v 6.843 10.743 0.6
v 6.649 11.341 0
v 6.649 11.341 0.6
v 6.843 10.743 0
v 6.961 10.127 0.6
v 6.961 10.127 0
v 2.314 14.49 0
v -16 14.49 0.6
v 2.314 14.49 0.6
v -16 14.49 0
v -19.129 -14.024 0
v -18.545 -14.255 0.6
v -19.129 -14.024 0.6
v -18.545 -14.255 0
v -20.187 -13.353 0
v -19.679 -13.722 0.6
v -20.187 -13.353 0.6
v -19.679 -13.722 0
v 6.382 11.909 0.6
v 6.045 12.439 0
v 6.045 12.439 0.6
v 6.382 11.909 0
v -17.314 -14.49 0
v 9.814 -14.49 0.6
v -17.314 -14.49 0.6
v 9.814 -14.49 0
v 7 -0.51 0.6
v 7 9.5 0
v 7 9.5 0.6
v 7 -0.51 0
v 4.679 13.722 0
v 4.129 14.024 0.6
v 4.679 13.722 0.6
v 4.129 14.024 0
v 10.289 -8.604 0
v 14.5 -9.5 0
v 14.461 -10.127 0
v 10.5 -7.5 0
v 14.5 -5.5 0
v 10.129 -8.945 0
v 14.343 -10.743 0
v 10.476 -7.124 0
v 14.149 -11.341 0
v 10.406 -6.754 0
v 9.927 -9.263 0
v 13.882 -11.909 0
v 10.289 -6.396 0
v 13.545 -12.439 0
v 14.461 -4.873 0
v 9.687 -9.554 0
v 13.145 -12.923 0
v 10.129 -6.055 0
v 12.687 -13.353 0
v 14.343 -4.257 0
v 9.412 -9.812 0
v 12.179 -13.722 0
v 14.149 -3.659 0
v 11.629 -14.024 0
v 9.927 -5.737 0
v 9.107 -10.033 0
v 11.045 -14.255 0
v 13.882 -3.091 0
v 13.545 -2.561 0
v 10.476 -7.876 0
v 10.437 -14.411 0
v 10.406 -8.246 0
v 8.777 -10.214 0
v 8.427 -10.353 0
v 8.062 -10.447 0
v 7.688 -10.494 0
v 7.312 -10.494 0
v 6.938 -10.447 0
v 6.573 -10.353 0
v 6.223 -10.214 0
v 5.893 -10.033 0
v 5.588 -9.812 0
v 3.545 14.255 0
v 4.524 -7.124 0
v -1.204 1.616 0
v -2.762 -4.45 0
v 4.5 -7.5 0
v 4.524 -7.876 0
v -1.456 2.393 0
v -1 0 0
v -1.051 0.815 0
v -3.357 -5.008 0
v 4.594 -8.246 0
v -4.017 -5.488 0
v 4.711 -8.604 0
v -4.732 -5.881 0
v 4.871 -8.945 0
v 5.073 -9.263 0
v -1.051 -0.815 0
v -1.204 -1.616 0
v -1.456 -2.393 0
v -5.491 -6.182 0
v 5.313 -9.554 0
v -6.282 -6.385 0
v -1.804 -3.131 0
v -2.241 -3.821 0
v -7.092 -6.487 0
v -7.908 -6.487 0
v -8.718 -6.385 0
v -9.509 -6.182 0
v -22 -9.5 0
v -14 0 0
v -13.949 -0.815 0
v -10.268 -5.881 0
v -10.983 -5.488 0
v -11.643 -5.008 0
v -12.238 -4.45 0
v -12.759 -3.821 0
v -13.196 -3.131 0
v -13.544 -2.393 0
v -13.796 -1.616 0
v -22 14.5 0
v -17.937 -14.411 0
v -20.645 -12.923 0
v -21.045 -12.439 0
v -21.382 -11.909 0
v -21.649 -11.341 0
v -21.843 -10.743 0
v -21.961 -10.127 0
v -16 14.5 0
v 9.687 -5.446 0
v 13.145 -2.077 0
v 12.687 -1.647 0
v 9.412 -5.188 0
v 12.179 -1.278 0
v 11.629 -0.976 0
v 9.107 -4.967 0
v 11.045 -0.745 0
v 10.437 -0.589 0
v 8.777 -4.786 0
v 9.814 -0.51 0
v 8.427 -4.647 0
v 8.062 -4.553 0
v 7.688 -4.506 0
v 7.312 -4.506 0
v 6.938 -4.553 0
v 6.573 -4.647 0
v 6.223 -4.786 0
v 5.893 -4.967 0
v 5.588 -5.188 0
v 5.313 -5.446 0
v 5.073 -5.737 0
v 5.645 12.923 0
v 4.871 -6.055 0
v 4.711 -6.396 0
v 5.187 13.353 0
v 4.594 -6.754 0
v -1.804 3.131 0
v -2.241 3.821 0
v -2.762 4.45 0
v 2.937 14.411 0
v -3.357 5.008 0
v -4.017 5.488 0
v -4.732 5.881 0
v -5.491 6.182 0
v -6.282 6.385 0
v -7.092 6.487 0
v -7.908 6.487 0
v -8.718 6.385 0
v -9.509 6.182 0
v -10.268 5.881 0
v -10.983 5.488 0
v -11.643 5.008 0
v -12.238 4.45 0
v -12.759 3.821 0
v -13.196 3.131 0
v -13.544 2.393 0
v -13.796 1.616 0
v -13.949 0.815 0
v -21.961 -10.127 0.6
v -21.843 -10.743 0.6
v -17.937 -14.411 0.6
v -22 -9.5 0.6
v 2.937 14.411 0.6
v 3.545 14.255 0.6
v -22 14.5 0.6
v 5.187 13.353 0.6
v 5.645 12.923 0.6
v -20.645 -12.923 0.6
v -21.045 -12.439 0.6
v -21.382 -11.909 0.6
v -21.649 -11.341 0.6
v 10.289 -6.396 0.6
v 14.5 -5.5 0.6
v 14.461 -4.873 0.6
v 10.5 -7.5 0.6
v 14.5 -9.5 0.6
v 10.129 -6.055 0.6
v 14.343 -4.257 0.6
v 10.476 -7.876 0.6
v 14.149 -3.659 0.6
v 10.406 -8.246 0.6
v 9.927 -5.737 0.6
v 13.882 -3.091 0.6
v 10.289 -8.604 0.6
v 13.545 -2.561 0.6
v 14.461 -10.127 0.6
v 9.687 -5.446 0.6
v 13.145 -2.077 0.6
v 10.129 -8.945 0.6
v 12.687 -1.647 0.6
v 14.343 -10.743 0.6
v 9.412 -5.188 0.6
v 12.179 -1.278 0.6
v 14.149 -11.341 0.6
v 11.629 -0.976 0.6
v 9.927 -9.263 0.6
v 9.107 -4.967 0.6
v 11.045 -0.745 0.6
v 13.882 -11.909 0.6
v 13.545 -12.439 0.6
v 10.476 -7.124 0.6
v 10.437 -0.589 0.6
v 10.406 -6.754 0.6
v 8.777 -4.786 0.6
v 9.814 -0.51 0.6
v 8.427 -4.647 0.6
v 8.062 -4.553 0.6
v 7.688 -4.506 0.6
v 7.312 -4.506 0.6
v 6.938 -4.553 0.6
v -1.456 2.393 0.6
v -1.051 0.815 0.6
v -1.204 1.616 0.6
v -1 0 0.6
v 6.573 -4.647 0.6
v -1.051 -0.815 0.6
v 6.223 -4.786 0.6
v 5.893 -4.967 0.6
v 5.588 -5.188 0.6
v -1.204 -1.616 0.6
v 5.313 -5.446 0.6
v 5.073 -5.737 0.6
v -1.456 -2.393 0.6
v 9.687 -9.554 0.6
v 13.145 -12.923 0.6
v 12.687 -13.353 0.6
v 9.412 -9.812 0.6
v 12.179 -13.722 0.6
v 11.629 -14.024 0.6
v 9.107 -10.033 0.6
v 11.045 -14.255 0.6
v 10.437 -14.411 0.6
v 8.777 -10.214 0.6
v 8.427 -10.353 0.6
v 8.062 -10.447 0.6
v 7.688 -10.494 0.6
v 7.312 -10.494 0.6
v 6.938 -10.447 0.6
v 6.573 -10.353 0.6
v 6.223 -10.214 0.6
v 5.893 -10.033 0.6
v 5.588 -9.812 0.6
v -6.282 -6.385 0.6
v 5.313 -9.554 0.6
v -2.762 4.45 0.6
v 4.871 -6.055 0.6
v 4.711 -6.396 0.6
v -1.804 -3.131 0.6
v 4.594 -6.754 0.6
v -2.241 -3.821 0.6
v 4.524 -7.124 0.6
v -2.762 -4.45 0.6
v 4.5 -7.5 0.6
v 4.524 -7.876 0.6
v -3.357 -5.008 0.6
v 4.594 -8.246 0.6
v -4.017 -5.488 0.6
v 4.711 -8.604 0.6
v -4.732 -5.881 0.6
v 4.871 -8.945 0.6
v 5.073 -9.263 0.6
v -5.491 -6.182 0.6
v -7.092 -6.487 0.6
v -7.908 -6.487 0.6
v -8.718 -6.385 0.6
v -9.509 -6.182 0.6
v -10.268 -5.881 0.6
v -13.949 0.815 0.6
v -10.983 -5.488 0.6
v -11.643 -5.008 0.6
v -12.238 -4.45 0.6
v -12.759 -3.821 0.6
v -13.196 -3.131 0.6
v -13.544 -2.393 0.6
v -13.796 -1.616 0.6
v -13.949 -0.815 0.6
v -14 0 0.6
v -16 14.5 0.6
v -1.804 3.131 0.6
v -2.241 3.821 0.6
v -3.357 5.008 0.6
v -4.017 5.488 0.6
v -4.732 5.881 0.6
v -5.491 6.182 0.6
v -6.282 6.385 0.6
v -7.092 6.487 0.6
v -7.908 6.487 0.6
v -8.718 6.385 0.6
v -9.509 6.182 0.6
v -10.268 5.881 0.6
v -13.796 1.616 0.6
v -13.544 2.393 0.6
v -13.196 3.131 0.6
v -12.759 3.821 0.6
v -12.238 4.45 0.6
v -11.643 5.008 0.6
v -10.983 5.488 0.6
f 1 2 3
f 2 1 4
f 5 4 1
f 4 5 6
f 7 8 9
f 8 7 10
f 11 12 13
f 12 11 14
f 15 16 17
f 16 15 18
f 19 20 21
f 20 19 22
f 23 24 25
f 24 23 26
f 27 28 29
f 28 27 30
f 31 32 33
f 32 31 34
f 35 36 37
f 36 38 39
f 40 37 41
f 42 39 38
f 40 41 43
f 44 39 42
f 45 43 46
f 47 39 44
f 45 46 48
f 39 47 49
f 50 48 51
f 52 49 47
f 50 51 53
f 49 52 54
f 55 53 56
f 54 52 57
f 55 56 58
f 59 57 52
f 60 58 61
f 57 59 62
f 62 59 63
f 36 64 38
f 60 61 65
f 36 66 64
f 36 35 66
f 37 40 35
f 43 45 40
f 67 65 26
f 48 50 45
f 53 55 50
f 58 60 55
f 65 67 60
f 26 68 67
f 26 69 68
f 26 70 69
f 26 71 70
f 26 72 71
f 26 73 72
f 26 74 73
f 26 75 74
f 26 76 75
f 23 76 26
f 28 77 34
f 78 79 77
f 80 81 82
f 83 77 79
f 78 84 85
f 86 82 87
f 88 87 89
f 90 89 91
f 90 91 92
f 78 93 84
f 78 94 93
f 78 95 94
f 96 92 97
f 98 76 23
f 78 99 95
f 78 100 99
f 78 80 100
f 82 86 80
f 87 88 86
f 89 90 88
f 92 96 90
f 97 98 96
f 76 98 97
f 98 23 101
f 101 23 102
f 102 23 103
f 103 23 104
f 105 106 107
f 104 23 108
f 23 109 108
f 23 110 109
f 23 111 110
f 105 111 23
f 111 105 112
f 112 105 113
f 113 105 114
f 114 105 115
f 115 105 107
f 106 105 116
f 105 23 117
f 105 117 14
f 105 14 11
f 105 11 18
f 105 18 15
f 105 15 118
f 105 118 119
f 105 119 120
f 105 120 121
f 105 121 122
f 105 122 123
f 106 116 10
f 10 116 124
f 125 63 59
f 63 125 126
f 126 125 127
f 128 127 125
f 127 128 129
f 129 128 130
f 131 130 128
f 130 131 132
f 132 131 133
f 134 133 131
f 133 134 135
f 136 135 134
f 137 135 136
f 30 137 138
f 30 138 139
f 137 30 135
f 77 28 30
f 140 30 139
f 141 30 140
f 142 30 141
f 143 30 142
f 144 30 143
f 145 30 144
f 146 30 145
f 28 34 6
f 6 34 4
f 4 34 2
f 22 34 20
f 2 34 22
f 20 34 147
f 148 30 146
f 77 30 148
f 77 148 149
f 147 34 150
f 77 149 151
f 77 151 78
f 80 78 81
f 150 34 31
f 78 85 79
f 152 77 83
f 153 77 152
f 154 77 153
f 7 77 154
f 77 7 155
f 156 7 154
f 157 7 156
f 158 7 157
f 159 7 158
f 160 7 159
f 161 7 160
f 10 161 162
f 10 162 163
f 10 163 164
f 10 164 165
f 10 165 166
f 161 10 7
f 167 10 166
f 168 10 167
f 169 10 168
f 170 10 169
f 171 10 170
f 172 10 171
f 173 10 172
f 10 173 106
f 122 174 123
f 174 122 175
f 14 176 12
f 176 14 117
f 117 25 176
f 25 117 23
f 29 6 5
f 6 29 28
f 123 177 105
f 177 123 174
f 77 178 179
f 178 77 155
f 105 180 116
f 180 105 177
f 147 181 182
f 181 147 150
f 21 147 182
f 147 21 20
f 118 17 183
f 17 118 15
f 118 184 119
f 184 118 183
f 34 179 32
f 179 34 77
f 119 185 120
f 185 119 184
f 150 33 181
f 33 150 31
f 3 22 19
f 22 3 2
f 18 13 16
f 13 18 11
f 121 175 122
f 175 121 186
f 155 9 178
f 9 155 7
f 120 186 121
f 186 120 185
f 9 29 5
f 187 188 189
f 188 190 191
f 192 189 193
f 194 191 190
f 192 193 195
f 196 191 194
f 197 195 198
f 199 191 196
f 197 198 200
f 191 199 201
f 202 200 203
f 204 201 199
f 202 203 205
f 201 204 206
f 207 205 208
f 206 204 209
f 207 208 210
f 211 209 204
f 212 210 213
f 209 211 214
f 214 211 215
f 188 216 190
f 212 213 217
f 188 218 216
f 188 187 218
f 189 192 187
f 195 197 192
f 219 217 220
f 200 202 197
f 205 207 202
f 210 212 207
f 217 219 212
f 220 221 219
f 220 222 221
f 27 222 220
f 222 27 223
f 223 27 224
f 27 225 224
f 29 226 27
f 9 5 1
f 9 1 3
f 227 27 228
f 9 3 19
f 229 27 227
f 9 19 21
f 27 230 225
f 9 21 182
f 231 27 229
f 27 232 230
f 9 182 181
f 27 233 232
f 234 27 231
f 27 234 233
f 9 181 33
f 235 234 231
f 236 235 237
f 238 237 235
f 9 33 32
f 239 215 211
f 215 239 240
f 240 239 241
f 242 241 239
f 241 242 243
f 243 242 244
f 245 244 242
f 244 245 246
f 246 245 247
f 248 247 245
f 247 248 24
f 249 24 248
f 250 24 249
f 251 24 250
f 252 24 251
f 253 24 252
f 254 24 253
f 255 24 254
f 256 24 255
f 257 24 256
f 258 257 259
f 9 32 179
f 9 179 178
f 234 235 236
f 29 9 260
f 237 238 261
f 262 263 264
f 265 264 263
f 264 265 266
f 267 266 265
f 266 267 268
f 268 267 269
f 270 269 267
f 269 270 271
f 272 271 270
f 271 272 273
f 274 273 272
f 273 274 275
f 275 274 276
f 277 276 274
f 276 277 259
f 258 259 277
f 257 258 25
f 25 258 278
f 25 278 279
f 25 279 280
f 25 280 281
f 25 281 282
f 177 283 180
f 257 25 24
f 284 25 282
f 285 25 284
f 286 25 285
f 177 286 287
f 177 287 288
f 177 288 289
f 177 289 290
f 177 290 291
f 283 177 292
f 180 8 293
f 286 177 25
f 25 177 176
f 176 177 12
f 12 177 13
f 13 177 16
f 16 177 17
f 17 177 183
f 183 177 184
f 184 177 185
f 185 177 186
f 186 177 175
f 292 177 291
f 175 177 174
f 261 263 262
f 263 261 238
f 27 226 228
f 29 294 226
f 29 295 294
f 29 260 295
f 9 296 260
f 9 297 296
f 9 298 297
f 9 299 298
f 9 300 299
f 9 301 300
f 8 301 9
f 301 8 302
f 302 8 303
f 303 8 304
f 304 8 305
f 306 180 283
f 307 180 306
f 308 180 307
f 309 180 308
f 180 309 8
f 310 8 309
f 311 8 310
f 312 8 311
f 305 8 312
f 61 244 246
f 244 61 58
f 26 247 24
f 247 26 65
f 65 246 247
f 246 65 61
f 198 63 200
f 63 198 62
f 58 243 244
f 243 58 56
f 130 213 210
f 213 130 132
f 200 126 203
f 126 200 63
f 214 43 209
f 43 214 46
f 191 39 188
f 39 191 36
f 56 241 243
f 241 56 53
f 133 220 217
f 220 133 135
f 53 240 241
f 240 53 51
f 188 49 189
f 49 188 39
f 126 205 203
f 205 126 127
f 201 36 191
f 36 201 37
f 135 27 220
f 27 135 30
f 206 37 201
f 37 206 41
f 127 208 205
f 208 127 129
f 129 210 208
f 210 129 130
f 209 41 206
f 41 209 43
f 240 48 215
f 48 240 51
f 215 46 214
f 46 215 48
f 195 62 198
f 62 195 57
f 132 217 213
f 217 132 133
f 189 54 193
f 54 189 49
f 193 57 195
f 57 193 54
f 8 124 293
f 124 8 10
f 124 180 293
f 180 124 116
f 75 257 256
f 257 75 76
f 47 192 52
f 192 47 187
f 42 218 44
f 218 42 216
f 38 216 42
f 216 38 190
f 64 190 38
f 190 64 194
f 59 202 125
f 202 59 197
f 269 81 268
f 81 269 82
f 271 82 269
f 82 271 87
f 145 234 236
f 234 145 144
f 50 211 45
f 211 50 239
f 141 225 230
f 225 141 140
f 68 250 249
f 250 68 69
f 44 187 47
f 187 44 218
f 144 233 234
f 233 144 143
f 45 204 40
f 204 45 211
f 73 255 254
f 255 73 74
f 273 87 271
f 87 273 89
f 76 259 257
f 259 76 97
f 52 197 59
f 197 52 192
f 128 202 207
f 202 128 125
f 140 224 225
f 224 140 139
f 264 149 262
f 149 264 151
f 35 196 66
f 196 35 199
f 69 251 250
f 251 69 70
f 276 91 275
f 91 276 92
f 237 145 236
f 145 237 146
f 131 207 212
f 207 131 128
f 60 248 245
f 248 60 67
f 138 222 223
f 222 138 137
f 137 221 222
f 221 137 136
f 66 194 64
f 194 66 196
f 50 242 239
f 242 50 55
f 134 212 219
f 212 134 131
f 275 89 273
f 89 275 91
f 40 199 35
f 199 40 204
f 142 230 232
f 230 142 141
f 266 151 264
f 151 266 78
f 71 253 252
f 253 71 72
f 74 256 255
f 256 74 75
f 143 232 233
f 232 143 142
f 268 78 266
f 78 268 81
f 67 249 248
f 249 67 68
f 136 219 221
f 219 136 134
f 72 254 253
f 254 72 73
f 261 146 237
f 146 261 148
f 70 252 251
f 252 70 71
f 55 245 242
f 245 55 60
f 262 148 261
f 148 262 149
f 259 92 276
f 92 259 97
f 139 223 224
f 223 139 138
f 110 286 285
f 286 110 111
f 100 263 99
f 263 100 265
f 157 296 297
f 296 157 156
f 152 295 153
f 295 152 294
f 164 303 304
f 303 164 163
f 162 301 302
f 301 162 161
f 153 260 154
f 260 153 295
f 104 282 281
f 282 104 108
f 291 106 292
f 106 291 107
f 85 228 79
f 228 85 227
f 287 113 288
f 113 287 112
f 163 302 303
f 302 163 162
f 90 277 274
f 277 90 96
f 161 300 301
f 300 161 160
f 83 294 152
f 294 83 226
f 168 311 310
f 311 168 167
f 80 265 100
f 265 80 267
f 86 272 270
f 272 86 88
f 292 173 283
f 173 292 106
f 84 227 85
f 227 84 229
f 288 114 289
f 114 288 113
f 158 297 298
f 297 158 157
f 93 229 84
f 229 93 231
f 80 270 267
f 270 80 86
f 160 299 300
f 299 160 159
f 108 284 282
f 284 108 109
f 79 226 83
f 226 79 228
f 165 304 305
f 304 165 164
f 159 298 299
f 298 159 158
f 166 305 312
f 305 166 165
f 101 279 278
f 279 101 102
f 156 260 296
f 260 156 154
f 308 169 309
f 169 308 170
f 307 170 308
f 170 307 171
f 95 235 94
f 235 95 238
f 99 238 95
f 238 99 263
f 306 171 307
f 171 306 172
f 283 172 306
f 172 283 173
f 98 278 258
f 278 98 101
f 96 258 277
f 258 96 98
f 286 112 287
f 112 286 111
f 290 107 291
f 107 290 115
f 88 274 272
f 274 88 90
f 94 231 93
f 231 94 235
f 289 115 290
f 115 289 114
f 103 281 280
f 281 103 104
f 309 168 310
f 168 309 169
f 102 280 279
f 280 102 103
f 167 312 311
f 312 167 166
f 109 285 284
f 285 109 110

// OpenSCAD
$fn = 50;


difference() {
	union() {
		translate(v = [-7.5000000000, 0, 0]) {
			hull() {
				translate(v = [-9.5000000000, 9.5000000000, 0]) {
					cylinder(h = 0.6000000000, r = 5);
				}
				translate(v = [9.5000000000, 9.5000000000, 0]) {
					cylinder(h = 0.6000000000, r = 5);
				}
				translate(v = [-9.5000000000, -9.5000000000, 0]) {
					cylinder(h = 0.6000000000, r = 5);
				}
				translate(v = [9.5000000000, -9.5000000000, 0]) {
					cylinder(h = 0.6000000000, r = 5);
				}
			}
		}
		translate(v = [0.0000000000, -7.5000000000, 0]) {
			hull() {
				translate(v = [-9.5000000000, 2.0000000000, 0]) {
					cylinder(h = 0.6000000000, r = 5);
				}
				translate(v = [9.5000000000, 2.0000000000, 0]) {
					cylinder(h = 0.6000000000, r = 5);
				}
				translate(v = [-9.5000000000, -2.0000000000, 0]) {
					cylinder(h = 0.6000000000, r = 5);
				}
				translate(v = [9.5000000000, -2.0000000000, 0]) {
					cylinder(h = 0.6000000000, r = 5);
				}
			}
		}
		translate(v = [-22.0000000000, 8.5000000000, 0]) {
			cube(size = [6, 6, 0.6000000000]);
		}
	}
	union() {
		translate(v = [7.5000000000, -7.5000000000, -100.0000000000]) {
			cylinder(h = 200, r = 3.0000000000);
		}
		translate(v = [-7.5000000000, 0, 0.0000000000]) {
			cylinder(h = 0.6000000000, r = 6.5000000000);
		}
	}
}
